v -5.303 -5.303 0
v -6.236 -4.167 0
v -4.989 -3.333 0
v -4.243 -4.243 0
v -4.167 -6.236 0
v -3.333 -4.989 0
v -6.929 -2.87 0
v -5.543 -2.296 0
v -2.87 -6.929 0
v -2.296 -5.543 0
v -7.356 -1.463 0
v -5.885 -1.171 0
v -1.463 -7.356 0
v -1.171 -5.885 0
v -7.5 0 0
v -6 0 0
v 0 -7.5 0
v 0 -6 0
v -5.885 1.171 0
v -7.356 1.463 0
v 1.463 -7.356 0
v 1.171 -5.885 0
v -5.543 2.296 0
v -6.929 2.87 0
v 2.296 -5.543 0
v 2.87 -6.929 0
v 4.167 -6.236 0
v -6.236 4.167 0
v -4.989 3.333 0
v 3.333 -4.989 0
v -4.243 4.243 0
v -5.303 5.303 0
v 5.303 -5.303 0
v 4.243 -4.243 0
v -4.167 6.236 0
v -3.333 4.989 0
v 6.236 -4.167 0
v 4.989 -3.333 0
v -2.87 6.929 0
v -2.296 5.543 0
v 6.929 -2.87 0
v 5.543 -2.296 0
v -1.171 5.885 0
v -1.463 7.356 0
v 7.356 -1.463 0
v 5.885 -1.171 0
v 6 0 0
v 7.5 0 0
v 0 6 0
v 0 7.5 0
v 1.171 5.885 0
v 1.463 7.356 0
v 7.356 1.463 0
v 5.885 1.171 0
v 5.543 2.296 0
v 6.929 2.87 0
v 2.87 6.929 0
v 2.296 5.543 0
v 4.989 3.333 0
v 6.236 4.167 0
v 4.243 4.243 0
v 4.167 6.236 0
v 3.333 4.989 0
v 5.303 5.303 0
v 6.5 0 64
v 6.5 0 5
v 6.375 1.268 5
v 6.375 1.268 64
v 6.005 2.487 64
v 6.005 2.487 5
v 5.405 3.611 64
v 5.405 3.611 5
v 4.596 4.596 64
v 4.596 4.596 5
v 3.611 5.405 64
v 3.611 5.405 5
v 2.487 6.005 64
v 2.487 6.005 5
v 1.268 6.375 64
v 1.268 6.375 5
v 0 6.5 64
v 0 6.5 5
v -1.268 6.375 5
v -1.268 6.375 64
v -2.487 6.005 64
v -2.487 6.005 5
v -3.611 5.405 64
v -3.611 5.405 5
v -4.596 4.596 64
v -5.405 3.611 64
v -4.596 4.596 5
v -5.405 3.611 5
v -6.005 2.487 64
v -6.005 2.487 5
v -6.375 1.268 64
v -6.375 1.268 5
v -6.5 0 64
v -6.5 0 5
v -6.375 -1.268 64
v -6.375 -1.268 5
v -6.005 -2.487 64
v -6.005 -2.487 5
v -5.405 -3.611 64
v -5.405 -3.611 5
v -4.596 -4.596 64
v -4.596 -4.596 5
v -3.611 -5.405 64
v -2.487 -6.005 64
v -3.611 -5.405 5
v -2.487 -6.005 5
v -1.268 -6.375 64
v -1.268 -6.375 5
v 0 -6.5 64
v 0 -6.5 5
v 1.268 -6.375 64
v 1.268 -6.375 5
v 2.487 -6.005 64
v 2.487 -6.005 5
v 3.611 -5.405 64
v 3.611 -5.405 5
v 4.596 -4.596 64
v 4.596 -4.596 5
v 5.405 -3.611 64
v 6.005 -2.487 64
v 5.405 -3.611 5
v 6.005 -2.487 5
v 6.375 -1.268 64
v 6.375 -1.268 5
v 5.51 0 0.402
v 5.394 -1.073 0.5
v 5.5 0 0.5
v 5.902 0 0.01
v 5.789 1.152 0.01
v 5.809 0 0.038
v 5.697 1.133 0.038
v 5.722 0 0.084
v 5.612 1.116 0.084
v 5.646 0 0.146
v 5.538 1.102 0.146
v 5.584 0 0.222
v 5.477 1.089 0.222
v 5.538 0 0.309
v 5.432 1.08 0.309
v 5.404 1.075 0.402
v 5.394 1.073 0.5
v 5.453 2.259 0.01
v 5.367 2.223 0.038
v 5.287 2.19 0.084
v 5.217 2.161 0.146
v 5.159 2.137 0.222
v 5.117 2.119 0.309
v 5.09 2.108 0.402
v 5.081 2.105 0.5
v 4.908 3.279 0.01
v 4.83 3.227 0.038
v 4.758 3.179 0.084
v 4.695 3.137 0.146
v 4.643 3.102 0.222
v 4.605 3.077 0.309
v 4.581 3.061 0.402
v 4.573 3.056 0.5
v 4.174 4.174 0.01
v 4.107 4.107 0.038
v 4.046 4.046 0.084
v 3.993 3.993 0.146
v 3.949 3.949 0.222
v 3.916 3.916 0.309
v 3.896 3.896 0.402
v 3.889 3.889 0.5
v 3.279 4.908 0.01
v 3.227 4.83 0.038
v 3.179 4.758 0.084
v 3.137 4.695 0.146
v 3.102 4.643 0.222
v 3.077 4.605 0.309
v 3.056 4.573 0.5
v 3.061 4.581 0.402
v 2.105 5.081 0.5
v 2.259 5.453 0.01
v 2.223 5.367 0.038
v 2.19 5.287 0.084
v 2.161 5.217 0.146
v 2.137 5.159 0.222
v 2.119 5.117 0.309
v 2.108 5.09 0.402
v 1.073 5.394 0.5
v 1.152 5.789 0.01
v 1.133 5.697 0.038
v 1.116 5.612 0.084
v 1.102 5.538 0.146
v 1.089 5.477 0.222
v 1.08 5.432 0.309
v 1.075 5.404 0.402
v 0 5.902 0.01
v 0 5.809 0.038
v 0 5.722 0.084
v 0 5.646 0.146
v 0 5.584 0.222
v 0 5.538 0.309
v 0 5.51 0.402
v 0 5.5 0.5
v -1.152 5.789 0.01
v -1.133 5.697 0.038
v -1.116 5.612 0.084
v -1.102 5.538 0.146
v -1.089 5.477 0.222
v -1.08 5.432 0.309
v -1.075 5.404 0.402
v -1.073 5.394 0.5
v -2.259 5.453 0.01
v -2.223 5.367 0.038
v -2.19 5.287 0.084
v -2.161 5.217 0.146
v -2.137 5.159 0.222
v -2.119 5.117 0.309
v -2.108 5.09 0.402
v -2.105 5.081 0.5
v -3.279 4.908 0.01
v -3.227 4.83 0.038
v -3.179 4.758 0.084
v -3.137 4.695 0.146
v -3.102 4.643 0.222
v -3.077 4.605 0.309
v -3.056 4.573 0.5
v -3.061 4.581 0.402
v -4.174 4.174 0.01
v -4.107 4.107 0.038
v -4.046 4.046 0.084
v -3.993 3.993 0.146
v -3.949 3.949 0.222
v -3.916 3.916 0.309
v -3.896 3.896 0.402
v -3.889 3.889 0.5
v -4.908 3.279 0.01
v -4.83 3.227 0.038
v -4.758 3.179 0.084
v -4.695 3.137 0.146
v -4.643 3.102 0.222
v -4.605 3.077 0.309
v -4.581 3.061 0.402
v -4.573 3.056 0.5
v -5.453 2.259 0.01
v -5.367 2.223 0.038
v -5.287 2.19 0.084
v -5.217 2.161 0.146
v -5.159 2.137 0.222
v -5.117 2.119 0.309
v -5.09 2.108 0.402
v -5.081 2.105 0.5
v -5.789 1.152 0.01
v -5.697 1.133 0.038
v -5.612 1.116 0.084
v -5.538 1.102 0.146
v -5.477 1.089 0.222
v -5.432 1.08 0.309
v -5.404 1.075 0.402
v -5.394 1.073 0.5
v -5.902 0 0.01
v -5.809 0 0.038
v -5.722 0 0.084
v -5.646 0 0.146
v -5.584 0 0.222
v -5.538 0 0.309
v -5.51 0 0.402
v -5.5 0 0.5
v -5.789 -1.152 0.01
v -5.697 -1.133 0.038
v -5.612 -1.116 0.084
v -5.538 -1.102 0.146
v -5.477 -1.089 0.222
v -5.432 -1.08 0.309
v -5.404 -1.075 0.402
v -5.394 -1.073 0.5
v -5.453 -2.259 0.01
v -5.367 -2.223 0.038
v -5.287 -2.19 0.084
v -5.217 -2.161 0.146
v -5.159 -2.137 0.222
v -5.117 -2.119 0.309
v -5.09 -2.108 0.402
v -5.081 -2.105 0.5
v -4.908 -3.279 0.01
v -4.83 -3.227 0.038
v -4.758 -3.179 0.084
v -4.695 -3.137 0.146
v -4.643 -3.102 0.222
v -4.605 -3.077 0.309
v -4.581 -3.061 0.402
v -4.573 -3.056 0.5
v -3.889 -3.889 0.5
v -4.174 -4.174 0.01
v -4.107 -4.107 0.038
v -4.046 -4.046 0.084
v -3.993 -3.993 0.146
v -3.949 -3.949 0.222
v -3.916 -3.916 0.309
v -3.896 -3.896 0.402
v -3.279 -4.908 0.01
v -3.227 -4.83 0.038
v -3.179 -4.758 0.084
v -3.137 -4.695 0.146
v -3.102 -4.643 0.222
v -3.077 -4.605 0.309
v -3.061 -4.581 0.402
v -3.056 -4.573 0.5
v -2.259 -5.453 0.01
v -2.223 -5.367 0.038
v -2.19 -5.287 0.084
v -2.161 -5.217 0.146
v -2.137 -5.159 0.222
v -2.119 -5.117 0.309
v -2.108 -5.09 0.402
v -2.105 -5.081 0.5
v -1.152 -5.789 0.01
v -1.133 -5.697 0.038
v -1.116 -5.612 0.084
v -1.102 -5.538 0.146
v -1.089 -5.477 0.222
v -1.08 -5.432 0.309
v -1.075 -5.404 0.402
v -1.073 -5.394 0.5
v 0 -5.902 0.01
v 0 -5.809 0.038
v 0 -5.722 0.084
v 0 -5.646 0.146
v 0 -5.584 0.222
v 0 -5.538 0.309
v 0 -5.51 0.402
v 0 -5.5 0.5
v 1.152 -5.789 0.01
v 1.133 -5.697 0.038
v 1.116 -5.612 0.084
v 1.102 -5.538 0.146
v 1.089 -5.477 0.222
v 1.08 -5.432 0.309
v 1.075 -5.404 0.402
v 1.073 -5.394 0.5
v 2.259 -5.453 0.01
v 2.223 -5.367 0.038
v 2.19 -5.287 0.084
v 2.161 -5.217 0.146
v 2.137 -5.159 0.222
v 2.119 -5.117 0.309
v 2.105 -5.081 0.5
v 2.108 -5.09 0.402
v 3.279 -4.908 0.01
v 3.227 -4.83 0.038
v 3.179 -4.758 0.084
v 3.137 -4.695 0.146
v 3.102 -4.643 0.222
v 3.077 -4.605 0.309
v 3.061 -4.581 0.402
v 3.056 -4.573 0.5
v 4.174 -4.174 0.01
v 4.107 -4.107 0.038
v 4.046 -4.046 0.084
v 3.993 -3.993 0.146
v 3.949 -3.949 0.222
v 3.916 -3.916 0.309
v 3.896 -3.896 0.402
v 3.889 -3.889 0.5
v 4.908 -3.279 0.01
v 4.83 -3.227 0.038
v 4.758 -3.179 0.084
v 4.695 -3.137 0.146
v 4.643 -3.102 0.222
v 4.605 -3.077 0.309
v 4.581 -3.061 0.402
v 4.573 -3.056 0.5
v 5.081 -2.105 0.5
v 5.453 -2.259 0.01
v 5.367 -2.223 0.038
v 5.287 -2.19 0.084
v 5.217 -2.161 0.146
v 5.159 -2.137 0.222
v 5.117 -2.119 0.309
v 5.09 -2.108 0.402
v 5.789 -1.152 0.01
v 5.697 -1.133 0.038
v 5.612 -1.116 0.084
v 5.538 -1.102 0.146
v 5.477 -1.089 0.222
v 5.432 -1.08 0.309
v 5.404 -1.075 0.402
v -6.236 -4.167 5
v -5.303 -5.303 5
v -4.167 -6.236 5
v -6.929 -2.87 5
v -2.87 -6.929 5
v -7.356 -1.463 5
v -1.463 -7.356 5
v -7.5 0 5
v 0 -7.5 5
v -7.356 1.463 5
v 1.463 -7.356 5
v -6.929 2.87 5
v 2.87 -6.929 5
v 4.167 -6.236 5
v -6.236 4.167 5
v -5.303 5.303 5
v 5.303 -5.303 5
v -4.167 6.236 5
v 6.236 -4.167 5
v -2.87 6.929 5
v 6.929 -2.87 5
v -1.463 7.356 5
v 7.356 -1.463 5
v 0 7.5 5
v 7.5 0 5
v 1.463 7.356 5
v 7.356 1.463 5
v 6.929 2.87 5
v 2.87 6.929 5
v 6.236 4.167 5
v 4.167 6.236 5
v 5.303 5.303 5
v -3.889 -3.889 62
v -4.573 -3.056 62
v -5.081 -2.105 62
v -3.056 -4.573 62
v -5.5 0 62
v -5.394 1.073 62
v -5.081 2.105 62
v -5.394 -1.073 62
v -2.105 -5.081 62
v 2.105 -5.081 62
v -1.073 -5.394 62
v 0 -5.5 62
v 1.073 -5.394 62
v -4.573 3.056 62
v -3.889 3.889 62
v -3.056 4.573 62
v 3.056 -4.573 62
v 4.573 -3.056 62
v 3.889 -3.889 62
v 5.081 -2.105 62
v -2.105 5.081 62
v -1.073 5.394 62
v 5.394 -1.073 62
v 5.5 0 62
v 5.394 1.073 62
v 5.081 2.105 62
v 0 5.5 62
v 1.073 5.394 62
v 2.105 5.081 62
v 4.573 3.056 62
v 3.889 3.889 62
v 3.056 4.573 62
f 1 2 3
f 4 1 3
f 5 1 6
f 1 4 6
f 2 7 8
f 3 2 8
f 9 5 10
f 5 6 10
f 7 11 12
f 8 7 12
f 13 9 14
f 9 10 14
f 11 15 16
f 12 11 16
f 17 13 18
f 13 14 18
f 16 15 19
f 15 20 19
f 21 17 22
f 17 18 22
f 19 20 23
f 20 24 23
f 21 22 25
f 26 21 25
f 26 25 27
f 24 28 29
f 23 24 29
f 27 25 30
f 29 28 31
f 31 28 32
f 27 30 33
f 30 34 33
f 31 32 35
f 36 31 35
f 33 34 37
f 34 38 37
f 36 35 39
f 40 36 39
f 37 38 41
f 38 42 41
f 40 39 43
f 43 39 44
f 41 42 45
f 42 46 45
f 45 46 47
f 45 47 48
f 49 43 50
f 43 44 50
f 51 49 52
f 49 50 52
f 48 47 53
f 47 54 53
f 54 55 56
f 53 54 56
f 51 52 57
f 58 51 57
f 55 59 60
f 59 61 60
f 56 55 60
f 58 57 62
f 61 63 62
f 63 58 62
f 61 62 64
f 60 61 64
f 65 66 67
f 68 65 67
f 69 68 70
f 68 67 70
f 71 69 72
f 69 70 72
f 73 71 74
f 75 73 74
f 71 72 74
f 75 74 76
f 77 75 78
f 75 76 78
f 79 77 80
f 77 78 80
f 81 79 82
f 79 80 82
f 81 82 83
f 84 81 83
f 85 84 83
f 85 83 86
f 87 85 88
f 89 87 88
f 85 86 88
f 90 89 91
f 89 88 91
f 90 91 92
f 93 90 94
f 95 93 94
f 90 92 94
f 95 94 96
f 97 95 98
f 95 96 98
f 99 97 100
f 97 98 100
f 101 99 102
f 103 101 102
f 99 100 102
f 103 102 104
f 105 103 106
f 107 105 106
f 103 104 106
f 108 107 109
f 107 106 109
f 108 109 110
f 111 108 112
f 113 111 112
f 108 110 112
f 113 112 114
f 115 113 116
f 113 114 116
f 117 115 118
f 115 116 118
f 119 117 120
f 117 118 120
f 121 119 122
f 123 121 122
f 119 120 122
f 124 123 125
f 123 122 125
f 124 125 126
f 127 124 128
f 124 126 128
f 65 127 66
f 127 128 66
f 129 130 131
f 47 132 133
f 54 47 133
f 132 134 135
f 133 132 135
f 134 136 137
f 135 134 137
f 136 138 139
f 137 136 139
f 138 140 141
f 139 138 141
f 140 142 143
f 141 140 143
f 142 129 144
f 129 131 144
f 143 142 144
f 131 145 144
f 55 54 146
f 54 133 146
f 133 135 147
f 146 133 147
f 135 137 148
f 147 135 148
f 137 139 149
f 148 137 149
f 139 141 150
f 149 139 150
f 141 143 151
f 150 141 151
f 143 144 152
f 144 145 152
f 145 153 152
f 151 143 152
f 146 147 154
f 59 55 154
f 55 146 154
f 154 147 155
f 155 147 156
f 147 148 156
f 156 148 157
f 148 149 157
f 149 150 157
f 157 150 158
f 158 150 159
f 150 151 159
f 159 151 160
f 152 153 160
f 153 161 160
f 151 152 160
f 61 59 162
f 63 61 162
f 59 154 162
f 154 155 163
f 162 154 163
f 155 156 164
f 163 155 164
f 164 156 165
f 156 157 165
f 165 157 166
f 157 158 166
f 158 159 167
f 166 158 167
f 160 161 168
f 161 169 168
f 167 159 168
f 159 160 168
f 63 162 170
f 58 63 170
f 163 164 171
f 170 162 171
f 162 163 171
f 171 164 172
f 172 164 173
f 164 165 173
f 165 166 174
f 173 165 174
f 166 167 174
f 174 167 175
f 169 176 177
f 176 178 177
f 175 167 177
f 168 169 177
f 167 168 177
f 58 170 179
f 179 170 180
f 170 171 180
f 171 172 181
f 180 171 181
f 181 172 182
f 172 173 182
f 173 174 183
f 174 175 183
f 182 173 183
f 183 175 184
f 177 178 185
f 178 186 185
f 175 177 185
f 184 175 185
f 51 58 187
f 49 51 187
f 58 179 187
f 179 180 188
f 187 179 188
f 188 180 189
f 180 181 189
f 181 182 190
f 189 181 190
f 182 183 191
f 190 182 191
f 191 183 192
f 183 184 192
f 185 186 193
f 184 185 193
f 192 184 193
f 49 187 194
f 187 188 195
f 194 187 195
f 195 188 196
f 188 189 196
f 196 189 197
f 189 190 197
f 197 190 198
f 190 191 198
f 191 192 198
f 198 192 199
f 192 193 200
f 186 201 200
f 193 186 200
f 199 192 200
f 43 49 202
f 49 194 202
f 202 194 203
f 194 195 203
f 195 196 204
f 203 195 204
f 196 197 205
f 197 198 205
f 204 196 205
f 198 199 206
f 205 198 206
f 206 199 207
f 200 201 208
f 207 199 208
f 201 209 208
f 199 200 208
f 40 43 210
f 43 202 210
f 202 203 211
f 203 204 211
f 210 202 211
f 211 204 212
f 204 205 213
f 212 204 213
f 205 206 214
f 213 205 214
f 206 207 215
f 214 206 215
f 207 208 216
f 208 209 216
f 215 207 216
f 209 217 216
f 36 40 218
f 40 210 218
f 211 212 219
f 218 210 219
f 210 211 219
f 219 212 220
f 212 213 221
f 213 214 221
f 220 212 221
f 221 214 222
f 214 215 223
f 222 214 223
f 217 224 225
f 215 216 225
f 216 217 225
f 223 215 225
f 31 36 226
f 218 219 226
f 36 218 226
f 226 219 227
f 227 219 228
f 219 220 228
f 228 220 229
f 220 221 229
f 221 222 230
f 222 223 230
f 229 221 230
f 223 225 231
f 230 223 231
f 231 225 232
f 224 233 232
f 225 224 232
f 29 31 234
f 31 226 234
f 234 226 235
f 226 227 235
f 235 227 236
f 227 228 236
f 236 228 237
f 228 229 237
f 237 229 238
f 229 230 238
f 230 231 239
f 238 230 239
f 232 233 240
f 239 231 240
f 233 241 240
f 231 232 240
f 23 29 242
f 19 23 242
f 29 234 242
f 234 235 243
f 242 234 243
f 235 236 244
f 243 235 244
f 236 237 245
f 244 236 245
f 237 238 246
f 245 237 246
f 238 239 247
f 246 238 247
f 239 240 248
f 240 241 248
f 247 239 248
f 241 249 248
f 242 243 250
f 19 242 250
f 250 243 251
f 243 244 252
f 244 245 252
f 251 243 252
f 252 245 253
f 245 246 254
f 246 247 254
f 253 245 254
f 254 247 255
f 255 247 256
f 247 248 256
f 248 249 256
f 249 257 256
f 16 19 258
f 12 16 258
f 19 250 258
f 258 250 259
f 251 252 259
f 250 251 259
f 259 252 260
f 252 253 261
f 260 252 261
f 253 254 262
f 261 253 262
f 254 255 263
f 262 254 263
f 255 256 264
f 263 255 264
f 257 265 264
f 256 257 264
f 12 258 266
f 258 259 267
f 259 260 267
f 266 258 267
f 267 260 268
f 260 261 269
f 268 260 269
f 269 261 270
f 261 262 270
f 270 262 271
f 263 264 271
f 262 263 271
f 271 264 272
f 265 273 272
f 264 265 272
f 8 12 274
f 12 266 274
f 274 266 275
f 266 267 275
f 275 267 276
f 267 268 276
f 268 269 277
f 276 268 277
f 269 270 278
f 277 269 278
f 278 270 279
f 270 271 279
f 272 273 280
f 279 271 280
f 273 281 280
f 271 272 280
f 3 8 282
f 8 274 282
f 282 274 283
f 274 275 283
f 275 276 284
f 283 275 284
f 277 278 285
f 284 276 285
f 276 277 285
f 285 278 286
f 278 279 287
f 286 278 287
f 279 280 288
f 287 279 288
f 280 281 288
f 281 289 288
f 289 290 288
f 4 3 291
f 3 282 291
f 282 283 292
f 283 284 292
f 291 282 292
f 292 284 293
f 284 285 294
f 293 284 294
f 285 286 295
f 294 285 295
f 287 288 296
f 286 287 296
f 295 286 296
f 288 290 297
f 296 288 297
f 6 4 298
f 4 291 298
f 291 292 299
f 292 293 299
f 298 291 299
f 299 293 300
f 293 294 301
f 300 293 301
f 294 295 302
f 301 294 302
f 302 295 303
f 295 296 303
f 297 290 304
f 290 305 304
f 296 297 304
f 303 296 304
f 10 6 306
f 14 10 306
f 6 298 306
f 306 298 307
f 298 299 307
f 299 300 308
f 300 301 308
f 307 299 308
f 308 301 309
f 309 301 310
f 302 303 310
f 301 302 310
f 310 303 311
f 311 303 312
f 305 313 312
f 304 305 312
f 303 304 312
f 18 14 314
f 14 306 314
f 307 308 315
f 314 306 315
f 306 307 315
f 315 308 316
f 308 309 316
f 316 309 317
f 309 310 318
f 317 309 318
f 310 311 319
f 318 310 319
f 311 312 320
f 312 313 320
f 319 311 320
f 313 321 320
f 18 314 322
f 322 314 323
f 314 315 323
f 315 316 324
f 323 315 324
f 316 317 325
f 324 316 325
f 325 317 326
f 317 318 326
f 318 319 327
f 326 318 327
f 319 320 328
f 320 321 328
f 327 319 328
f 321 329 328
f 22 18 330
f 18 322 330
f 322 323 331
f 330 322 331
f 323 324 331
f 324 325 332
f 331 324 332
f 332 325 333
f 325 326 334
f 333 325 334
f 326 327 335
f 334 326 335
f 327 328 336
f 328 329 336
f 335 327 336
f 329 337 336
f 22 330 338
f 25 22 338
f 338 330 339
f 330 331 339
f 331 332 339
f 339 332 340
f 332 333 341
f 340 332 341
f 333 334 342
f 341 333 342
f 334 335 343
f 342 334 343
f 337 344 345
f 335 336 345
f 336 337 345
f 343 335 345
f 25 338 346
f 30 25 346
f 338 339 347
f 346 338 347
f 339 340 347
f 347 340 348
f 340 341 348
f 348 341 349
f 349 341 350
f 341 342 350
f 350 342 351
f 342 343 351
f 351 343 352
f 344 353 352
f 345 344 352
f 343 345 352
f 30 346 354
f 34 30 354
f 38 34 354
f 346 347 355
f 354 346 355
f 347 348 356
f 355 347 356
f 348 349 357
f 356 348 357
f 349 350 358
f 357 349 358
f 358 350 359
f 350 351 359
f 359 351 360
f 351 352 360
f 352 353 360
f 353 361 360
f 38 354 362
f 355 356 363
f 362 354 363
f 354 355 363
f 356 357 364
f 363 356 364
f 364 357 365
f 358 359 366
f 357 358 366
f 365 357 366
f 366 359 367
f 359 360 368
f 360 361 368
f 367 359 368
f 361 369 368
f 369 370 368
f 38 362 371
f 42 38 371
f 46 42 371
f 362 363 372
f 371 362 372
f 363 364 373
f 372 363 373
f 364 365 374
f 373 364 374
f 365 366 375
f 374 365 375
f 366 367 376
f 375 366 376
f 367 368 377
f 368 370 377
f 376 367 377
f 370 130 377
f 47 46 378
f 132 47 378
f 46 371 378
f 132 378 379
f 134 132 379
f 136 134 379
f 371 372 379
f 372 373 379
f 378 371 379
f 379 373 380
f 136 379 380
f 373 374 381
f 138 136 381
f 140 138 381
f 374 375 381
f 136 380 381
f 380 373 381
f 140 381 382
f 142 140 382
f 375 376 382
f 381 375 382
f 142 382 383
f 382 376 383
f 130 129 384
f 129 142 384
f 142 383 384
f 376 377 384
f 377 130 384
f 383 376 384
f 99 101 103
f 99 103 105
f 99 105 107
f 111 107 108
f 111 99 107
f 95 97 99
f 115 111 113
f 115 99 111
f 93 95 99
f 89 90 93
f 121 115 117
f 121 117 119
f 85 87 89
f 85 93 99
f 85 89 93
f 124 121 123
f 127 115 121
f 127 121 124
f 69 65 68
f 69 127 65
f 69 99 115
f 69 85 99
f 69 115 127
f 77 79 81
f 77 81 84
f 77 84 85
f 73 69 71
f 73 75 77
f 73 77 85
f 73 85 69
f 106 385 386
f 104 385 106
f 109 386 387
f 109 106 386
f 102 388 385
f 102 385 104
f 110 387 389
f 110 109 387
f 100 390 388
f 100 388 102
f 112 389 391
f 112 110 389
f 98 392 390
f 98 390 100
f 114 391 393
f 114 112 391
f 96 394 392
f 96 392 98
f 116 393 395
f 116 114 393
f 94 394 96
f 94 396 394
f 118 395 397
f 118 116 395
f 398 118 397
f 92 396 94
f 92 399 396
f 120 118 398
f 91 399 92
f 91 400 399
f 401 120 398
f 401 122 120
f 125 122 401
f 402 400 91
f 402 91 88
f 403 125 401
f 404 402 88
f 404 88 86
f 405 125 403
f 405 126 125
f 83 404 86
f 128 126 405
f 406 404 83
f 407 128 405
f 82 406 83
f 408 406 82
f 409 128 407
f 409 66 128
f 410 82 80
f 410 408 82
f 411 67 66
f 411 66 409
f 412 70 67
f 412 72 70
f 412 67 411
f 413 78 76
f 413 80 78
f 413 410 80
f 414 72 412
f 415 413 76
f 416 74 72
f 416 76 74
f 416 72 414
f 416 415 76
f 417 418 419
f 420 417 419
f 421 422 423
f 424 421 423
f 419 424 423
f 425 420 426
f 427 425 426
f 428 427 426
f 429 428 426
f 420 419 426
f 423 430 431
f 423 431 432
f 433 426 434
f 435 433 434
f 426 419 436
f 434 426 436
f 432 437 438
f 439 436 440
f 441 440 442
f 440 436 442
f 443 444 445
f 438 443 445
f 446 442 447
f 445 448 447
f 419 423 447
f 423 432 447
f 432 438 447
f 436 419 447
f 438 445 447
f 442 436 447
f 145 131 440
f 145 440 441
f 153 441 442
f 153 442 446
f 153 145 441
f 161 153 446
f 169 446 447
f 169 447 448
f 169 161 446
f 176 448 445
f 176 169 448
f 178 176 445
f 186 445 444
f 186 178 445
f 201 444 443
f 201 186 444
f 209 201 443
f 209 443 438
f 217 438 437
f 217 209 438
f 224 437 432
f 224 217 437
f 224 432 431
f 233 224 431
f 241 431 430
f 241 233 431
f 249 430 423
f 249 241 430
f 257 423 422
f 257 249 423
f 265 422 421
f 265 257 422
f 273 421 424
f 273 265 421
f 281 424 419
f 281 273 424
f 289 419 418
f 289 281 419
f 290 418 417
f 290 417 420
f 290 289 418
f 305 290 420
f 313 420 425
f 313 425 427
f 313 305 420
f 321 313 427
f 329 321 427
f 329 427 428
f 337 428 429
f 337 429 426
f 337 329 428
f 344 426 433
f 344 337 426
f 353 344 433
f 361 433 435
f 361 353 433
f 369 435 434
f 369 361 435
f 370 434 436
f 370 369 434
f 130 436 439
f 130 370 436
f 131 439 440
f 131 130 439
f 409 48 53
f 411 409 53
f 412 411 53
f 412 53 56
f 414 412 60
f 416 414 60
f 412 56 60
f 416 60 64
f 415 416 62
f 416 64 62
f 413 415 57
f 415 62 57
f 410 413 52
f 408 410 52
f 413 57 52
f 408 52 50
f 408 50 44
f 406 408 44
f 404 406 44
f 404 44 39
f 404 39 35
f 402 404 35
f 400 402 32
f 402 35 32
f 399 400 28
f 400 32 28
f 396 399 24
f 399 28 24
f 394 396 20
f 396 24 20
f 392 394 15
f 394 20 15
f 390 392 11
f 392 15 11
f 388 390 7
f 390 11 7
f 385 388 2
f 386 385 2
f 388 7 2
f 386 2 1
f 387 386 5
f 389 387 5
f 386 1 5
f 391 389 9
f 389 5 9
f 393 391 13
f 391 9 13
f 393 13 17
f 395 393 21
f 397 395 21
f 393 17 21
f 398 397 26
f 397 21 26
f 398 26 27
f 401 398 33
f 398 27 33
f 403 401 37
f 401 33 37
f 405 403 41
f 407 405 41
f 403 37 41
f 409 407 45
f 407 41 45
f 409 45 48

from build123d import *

# Parameters (mm, degrees)
F0_R     = 6.5
F0_R_2   = 5.5
F1_DEPTH = 62
F2_R     = 6.5
F3_DEPTH = 2
F4_R     = 7.5
F4_R_2   = 6.5
F5_DEPTH = 5
F6_R     = 0.5


with BuildPart() as f1:
    # F0 (on Top) → F1 (new body)
    with BuildSketch(Plane.XY):
        Circle(F0_R)
        Circle(F0_R_2, mode=Mode.SUBTRACT)
    extrude(amount=F1_DEPTH)

    # F2 (on face) → F3 (join)
    with BuildSketch(Plane.XY.offset(62)):
        Circle(F2_R)
    extrude(amount=F3_DEPTH)

    # F4 (on Top) → F5 (join)
    with BuildSketch(Plane.XY):
        Circle(F4_R)
        Circle(F4_R_2, mode=Mode.SUBTRACT)
    extrude(amount=F5_DEPTH)

    # F6
    f6_edges = [f1.edges().sort_by_distance(p)[0] for p in [
        (-5.5, 0, 0),
    ]]
    fillet(f6_edges, radius=F6_R)


solid = f1.part
